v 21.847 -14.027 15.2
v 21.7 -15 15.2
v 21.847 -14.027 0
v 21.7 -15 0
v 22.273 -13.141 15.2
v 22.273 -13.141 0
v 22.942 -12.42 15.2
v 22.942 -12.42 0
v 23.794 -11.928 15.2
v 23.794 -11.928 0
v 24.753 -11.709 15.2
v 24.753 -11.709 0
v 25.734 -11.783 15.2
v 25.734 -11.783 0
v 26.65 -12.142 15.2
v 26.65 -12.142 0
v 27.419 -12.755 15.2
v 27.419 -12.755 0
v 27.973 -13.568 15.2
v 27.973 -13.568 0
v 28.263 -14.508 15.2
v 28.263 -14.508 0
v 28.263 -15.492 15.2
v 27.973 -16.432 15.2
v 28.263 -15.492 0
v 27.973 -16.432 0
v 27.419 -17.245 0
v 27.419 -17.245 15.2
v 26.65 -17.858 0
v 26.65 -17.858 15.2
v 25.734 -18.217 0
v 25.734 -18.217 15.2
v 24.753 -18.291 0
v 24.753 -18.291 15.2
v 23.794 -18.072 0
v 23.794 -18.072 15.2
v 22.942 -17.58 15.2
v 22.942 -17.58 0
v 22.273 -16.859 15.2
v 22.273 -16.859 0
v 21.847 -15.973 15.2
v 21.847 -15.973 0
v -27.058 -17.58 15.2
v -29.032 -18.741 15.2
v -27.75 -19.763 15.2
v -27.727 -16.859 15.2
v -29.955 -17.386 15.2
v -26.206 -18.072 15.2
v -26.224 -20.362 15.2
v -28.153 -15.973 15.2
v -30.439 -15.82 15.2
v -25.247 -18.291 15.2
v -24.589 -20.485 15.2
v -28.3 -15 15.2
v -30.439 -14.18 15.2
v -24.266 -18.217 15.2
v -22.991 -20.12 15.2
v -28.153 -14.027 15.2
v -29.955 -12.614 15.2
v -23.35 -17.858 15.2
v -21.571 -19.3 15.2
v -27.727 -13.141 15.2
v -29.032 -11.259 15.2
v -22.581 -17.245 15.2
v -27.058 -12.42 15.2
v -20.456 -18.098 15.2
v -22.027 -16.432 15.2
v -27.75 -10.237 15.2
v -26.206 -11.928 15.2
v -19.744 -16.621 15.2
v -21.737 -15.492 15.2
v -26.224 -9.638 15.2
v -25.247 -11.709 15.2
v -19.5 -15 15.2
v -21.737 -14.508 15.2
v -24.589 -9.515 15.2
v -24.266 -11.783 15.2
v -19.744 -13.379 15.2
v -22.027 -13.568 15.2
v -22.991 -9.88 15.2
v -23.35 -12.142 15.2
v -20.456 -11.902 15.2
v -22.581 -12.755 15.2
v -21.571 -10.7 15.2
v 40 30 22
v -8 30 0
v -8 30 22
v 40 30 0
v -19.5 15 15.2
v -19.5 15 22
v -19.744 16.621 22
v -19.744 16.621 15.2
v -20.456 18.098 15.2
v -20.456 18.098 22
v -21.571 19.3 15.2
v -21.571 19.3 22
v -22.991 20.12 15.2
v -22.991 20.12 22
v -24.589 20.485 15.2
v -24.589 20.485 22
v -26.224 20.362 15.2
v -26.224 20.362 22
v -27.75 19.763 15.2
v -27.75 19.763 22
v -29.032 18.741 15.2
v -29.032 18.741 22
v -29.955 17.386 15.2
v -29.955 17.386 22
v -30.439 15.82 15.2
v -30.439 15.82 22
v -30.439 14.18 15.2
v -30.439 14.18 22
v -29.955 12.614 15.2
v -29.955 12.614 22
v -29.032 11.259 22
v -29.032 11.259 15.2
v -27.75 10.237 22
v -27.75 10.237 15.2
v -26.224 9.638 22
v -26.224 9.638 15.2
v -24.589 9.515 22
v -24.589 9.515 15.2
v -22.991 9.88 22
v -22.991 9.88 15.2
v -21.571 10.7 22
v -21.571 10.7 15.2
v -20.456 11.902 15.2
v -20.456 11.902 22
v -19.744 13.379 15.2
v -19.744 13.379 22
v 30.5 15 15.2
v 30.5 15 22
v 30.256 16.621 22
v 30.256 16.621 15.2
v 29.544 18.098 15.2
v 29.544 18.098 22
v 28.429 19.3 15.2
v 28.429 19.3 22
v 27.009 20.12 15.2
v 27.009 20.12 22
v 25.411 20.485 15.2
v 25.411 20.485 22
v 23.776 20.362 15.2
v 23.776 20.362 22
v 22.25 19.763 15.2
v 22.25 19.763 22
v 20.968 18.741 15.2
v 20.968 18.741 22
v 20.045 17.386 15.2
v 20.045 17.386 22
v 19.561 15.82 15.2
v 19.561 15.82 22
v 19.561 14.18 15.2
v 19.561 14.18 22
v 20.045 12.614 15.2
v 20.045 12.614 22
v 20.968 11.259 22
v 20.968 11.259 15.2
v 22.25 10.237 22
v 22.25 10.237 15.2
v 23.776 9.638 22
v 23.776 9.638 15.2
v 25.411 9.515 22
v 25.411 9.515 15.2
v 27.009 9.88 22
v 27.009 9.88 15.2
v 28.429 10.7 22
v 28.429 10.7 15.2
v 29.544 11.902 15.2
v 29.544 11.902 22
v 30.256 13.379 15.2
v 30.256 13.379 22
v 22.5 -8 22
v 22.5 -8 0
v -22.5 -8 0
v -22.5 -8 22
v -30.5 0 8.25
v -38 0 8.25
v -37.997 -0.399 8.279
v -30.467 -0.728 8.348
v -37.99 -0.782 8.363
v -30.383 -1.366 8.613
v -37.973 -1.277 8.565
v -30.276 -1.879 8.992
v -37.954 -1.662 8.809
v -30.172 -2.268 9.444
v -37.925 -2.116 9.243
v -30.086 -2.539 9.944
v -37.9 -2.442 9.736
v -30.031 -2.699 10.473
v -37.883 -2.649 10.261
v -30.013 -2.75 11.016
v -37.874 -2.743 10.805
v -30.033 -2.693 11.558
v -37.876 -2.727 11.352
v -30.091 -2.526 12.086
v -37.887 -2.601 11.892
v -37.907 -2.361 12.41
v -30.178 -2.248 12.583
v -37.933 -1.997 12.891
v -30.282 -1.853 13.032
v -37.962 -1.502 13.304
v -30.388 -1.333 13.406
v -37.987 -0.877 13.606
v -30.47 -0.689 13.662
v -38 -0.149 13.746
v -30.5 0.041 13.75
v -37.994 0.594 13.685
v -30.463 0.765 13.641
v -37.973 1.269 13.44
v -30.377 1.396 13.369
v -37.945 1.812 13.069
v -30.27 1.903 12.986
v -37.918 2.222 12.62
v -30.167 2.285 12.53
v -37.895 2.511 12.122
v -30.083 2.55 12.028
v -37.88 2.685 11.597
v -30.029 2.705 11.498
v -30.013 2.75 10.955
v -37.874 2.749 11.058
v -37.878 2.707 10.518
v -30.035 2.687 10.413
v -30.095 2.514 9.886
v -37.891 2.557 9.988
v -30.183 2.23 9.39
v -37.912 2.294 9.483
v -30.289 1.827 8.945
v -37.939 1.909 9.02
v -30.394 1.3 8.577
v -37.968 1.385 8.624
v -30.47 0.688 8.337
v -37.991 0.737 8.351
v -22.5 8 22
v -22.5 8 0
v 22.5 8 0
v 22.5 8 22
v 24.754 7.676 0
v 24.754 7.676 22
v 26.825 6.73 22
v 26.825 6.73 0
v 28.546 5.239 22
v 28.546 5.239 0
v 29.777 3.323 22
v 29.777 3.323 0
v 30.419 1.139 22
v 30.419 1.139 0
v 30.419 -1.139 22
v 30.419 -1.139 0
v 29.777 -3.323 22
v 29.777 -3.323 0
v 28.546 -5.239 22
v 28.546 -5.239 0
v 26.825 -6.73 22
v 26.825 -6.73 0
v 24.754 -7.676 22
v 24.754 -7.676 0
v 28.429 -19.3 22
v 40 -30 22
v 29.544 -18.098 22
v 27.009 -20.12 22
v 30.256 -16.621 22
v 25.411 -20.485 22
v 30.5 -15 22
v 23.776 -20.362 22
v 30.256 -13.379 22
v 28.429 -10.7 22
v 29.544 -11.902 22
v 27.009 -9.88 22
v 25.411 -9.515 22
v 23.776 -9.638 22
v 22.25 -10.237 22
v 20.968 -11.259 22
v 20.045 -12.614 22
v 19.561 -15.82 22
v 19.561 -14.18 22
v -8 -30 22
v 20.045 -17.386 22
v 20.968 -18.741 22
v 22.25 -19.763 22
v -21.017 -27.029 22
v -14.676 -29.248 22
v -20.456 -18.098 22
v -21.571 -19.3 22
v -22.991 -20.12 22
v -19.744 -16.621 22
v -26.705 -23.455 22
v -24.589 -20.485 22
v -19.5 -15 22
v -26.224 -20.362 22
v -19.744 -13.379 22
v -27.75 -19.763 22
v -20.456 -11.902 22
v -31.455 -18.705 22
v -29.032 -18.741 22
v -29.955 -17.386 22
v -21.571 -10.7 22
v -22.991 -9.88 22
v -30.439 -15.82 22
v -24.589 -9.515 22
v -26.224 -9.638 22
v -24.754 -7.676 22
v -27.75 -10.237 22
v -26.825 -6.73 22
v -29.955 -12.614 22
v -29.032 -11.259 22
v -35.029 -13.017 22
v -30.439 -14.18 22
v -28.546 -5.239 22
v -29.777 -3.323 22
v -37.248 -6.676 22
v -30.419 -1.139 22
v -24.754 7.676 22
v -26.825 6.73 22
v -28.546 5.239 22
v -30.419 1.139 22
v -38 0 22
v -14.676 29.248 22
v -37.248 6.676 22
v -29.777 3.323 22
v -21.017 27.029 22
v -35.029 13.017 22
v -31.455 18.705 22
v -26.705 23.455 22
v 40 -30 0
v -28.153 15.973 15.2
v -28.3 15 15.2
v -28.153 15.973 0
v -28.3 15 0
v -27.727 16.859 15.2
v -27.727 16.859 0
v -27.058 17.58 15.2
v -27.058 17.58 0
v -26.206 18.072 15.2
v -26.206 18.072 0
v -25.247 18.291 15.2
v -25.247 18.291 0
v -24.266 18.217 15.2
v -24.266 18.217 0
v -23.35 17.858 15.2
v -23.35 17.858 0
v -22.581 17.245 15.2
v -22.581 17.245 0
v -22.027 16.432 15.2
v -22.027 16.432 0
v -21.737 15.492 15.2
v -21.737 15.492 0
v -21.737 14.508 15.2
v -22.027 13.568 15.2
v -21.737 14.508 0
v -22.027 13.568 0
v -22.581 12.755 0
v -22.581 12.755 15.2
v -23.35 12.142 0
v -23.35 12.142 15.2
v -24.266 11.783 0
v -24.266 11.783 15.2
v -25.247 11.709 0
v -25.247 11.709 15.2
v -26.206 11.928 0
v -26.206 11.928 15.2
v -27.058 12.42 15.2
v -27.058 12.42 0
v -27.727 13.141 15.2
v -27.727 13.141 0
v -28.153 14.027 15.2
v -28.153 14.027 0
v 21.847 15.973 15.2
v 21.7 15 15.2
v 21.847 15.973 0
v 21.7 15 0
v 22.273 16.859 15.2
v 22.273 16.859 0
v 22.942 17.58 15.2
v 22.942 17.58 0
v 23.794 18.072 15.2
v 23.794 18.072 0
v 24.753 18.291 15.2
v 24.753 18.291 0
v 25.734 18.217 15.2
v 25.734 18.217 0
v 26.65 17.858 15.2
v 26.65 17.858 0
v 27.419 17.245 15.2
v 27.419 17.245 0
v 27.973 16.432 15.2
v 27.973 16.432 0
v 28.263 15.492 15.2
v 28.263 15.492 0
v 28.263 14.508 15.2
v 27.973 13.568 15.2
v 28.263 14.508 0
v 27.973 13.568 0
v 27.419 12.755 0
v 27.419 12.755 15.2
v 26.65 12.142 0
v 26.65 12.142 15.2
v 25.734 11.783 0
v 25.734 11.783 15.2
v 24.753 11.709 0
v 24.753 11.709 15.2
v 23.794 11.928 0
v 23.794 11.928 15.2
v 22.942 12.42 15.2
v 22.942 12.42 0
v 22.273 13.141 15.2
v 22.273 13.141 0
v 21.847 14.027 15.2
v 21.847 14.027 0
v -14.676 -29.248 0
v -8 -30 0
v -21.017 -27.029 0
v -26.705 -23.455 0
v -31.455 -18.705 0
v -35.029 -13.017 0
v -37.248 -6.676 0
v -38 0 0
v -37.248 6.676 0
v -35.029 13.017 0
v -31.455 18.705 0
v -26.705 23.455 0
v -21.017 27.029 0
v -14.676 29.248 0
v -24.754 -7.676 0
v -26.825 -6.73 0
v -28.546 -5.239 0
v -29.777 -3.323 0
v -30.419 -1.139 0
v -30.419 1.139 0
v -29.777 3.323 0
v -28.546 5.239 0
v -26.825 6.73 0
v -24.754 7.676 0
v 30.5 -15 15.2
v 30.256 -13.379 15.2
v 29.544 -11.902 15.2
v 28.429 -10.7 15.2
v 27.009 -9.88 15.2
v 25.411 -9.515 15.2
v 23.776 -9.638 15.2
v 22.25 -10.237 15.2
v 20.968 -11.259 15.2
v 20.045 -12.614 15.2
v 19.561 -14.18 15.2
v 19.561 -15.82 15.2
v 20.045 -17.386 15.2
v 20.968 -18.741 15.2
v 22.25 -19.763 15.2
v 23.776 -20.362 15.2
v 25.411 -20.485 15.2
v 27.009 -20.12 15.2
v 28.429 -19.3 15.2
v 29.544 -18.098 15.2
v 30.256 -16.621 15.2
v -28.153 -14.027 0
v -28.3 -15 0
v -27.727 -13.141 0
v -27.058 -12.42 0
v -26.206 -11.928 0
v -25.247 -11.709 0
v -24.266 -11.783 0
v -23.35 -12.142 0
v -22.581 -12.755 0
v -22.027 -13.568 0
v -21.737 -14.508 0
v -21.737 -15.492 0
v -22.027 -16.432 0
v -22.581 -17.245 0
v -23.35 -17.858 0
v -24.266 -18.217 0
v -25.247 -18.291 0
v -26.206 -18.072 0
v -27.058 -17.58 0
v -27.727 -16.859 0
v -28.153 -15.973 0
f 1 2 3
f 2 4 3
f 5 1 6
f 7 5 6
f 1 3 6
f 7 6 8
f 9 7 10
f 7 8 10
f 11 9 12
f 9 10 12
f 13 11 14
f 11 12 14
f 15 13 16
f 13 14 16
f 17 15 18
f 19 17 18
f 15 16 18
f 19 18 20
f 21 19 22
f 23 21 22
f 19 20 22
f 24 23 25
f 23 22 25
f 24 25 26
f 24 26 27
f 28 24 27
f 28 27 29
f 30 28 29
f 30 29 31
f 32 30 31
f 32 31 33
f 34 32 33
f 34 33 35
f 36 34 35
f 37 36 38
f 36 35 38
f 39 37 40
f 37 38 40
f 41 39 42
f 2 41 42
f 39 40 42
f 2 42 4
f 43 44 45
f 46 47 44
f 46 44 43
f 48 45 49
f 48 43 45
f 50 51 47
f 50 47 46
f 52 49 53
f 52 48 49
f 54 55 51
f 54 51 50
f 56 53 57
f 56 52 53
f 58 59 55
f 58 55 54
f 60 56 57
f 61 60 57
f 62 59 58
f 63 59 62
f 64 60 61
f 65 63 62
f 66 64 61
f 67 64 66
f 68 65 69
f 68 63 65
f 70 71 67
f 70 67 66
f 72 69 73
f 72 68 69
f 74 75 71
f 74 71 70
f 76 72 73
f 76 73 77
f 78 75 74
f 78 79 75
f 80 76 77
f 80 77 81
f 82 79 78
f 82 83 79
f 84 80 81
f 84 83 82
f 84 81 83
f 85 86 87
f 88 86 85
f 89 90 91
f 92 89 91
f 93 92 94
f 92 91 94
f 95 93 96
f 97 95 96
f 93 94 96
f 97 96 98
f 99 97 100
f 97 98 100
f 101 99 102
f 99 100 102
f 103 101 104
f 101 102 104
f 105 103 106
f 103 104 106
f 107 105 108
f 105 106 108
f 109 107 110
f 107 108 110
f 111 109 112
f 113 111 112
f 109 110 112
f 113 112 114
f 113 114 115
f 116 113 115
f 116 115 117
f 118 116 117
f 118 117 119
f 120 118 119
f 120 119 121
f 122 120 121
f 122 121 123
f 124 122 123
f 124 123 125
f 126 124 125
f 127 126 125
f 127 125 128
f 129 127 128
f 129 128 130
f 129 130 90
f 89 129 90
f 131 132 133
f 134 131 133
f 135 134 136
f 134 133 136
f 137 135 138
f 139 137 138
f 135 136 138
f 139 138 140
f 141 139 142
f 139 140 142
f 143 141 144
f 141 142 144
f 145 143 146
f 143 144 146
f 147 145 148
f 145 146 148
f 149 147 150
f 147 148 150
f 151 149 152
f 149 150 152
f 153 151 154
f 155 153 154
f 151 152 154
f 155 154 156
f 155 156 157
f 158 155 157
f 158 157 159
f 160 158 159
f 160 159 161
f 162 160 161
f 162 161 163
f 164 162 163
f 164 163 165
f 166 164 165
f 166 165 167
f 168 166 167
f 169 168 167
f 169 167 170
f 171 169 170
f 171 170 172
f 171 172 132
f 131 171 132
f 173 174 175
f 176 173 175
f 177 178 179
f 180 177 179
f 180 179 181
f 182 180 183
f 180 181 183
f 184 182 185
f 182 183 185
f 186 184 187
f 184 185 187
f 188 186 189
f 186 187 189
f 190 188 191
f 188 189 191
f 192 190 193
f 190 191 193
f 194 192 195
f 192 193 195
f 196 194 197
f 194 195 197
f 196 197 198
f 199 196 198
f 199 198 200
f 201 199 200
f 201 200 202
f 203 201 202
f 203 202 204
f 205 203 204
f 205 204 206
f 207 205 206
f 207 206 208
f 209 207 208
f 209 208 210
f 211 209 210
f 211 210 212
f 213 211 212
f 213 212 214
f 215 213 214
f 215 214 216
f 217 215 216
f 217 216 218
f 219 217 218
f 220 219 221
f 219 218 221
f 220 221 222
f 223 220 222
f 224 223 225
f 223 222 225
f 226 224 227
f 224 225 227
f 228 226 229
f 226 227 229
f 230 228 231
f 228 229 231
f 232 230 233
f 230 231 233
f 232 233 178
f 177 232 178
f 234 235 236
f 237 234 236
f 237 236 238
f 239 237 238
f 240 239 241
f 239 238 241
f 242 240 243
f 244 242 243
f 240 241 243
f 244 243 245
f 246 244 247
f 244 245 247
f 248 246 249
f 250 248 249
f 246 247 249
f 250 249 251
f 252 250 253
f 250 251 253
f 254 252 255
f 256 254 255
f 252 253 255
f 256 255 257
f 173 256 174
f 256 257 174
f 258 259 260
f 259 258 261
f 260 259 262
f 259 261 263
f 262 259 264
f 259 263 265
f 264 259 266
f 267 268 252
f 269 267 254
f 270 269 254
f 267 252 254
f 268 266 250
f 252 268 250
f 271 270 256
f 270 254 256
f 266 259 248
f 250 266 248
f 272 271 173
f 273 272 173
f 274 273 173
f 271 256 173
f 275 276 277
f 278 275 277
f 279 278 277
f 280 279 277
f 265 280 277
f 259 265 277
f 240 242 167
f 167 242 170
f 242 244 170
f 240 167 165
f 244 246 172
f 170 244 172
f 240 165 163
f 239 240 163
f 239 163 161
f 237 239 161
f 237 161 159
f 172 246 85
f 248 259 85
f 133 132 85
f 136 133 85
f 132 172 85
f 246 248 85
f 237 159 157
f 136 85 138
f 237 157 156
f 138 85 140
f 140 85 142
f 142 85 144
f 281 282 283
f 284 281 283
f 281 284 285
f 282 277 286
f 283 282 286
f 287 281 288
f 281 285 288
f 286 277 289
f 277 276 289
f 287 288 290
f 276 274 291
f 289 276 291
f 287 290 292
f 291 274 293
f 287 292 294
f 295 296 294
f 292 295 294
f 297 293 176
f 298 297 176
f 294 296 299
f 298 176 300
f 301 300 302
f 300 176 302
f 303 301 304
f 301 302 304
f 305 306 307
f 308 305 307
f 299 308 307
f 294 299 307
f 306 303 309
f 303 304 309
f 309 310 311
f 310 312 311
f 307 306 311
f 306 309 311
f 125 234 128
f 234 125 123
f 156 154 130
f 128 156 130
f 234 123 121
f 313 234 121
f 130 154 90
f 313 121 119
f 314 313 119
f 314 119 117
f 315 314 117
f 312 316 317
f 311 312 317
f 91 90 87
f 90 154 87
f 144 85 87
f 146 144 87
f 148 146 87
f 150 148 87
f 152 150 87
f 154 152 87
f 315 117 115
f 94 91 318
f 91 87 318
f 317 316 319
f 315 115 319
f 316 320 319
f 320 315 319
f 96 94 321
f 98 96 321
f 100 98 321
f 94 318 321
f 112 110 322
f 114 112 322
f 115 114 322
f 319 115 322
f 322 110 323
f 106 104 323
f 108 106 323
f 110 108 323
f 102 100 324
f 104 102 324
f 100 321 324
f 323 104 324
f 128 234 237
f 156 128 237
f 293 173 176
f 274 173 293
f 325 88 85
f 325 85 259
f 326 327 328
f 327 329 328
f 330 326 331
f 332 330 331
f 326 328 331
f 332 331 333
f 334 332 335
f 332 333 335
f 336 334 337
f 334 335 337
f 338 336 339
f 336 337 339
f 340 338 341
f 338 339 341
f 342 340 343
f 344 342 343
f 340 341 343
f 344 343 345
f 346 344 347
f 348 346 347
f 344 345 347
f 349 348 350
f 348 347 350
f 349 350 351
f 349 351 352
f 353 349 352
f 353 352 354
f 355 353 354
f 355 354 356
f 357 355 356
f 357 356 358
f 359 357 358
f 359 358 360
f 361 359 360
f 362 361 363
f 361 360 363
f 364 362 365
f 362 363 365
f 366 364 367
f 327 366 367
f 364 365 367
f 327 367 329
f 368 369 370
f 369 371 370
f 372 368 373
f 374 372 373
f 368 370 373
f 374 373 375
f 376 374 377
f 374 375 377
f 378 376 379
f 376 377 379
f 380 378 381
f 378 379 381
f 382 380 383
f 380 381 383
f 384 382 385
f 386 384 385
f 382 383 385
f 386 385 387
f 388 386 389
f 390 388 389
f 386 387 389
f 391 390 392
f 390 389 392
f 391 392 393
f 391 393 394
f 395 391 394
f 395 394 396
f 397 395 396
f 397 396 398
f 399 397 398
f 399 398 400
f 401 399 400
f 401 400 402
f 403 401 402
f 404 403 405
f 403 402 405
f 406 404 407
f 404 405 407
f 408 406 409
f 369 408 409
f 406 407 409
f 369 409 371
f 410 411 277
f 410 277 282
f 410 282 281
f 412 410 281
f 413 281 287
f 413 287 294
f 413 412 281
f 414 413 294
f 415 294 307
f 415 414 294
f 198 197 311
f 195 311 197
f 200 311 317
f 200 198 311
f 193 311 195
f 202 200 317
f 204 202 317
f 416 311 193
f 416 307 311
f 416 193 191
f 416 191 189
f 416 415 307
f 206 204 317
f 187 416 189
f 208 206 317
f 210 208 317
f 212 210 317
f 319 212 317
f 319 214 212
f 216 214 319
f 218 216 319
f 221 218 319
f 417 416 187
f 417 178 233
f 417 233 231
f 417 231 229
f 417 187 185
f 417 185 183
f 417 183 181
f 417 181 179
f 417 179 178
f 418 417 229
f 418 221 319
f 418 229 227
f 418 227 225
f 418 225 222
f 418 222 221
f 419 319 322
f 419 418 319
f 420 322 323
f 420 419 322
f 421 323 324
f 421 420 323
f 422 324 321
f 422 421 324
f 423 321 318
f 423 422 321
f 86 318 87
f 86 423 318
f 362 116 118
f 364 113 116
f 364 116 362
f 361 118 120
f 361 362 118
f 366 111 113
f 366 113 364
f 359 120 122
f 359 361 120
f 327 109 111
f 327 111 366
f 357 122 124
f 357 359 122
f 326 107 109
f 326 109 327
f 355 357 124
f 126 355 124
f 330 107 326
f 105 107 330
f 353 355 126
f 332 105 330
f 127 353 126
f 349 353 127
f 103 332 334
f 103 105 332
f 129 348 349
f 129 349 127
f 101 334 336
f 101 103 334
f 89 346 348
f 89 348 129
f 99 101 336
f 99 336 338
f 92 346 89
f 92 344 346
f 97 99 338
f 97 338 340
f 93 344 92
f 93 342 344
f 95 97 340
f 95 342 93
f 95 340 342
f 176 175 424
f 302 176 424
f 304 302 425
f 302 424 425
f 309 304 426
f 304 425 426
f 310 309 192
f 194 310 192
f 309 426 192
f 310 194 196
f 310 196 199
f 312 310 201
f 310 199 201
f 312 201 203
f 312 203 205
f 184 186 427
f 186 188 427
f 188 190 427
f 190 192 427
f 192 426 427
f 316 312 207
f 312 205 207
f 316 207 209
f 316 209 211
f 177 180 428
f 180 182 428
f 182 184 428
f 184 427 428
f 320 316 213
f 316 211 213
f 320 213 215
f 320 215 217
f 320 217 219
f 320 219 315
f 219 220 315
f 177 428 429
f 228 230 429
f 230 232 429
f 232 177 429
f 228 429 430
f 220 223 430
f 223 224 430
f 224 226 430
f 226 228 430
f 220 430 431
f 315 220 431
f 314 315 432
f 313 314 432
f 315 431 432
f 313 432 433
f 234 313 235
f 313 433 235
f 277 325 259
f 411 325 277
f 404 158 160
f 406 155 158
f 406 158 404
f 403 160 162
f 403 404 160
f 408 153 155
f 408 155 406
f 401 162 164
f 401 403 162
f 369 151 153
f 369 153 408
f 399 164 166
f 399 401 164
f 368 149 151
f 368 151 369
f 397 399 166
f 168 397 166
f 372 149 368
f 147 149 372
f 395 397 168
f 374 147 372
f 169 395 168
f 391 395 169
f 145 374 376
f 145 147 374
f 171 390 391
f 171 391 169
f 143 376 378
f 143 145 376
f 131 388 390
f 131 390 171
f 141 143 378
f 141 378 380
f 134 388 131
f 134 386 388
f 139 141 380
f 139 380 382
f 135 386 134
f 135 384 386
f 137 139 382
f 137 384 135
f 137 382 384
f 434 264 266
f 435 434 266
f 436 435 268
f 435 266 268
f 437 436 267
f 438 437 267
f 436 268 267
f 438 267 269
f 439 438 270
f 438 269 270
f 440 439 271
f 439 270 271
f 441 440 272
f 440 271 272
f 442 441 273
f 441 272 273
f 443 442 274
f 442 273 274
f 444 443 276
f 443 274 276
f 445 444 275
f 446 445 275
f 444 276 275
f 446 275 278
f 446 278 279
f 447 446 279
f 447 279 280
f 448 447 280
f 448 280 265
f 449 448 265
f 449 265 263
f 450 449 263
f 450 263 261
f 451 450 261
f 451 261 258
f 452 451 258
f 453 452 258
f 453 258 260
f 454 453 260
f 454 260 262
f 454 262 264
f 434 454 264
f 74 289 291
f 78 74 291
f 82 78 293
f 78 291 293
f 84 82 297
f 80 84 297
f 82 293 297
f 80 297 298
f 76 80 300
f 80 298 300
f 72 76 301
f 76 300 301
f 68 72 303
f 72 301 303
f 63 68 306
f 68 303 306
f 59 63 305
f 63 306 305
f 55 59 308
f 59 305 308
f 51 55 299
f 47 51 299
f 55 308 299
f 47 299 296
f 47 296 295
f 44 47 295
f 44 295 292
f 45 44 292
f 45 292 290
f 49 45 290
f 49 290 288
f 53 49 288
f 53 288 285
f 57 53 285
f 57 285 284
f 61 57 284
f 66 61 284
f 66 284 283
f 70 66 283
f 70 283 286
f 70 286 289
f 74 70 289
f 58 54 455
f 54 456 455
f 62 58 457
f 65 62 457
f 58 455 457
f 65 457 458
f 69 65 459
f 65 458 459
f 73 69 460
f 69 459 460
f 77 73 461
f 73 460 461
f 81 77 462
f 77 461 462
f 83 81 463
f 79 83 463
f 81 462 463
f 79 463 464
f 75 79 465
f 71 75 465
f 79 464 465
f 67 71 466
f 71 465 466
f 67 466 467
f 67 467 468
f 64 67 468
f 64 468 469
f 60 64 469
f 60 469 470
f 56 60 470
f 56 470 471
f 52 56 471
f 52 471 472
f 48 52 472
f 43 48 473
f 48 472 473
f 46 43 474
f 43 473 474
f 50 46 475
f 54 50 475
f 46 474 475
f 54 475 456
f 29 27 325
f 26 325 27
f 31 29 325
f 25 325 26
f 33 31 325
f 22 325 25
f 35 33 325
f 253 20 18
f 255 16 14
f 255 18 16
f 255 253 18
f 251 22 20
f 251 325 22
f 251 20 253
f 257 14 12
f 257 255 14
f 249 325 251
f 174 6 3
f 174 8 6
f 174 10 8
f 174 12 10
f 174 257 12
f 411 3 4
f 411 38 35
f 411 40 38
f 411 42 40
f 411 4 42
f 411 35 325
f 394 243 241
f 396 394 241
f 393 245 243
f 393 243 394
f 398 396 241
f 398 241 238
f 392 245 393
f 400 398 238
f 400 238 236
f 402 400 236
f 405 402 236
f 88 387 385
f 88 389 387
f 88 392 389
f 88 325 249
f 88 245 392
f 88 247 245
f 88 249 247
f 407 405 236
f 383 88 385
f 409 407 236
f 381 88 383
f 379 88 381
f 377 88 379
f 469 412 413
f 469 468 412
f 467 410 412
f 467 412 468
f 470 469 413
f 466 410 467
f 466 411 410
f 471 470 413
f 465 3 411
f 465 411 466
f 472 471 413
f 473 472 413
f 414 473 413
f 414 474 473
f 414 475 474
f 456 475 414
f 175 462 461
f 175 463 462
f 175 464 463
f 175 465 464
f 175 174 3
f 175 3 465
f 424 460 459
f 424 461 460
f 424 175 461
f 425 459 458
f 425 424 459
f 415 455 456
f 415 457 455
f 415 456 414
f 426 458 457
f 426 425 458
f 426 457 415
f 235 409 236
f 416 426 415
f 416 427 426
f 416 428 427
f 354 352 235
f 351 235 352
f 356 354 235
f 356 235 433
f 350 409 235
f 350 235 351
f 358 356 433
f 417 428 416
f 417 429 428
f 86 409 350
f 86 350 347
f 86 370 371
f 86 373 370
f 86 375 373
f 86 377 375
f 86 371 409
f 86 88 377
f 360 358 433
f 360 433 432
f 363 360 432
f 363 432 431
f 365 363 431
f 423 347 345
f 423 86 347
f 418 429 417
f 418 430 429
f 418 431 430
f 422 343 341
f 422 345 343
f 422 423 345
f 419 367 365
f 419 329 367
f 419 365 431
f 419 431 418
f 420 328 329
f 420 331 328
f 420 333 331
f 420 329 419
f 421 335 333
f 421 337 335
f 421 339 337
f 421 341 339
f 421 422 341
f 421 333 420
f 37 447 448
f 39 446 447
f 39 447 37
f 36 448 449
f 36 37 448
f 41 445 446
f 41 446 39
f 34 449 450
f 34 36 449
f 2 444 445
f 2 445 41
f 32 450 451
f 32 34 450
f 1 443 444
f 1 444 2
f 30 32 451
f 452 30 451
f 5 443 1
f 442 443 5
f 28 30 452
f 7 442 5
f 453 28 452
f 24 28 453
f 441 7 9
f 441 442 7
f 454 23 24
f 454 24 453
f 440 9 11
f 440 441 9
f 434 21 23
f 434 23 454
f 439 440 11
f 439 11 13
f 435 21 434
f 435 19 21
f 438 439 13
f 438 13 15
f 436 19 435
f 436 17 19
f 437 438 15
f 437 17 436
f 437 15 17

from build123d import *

# Parameters (mm, degrees)
EXTRUDE_1_DEPTH           = 22
HOLE_WIZARD_1_D           = 6.6
HOLE_WIZARD_1_CBORE_D     = 11
HOLE_WIZARD_1_CBORE_DEPTH = 6.8
MM_1_REACH                = 86.291
MM_1_BORE_R               = 2.75


with BuildPart() as part:
    # 草图1 → 凸台-拉伸1 (new body)
    with BuildSketch(Plane.XY):
        with BuildLine():
            Line((-8, 30), (40, 30))
            Line((40, 30), (40, -30))
            Line((40, -30), (-8, -30))
            ThreePointArc((-8, -30), (-38, 0), (-8, 30))
        make_face()
        with BuildLine():
            Line((-22.5, 8), (22.5, 8))
            ThreePointArc((22.5, 8), (30.5, 0), (22.5, -8))
            Line((22.5, -8), (-22.5, -8))
            ThreePointArc((-22.5, -8), (-30.5, 0), (-22.5, 8))
        make_face(mode=Mode.SUBTRACT)
    extrude(amount=EXTRUDE_1_DEPTH)

    # 打孔尺寸(%根据)内六角圆柱头螺钉的类型1 (through all)
    with Locations(Plane(origin=(-25, 15, 22), x_dir=(1, 0, 0), z_dir=(0, 0, 1))):
        with Locations((0, 0), (0, -30), (50, 0), (50, -30)):
            CounterBoreHole(HOLE_WIZARD_1_D / 2, HOLE_WIZARD_1_CBORE_D / 2, HOLE_WIZARD_1_CBORE_DEPTH)

    # 大小mm 暗销孔1 bore (on position points) → 大小mm 暗销孔1 (cut, up to next)
    with BuildSketch(Plane(origin=(-38, 0, 11), x_dir=(0, 0, -1), z_dir=(-1, 0, 0)), mode=Mode.PRIVATE) as mm_1_sk1:
        Circle(MM_1_BORE_R)
    mm_1_tool1 = extrude(mm_1_sk1.sketch, amount=-MM_1_REACH, mode=Mode.PRIVATE) & part.part
    add(mm_1_tool1.solids().sort_by_distance((-38, 0, 11))[0], mode=Mode.SUBTRACT)


solid = part.part
